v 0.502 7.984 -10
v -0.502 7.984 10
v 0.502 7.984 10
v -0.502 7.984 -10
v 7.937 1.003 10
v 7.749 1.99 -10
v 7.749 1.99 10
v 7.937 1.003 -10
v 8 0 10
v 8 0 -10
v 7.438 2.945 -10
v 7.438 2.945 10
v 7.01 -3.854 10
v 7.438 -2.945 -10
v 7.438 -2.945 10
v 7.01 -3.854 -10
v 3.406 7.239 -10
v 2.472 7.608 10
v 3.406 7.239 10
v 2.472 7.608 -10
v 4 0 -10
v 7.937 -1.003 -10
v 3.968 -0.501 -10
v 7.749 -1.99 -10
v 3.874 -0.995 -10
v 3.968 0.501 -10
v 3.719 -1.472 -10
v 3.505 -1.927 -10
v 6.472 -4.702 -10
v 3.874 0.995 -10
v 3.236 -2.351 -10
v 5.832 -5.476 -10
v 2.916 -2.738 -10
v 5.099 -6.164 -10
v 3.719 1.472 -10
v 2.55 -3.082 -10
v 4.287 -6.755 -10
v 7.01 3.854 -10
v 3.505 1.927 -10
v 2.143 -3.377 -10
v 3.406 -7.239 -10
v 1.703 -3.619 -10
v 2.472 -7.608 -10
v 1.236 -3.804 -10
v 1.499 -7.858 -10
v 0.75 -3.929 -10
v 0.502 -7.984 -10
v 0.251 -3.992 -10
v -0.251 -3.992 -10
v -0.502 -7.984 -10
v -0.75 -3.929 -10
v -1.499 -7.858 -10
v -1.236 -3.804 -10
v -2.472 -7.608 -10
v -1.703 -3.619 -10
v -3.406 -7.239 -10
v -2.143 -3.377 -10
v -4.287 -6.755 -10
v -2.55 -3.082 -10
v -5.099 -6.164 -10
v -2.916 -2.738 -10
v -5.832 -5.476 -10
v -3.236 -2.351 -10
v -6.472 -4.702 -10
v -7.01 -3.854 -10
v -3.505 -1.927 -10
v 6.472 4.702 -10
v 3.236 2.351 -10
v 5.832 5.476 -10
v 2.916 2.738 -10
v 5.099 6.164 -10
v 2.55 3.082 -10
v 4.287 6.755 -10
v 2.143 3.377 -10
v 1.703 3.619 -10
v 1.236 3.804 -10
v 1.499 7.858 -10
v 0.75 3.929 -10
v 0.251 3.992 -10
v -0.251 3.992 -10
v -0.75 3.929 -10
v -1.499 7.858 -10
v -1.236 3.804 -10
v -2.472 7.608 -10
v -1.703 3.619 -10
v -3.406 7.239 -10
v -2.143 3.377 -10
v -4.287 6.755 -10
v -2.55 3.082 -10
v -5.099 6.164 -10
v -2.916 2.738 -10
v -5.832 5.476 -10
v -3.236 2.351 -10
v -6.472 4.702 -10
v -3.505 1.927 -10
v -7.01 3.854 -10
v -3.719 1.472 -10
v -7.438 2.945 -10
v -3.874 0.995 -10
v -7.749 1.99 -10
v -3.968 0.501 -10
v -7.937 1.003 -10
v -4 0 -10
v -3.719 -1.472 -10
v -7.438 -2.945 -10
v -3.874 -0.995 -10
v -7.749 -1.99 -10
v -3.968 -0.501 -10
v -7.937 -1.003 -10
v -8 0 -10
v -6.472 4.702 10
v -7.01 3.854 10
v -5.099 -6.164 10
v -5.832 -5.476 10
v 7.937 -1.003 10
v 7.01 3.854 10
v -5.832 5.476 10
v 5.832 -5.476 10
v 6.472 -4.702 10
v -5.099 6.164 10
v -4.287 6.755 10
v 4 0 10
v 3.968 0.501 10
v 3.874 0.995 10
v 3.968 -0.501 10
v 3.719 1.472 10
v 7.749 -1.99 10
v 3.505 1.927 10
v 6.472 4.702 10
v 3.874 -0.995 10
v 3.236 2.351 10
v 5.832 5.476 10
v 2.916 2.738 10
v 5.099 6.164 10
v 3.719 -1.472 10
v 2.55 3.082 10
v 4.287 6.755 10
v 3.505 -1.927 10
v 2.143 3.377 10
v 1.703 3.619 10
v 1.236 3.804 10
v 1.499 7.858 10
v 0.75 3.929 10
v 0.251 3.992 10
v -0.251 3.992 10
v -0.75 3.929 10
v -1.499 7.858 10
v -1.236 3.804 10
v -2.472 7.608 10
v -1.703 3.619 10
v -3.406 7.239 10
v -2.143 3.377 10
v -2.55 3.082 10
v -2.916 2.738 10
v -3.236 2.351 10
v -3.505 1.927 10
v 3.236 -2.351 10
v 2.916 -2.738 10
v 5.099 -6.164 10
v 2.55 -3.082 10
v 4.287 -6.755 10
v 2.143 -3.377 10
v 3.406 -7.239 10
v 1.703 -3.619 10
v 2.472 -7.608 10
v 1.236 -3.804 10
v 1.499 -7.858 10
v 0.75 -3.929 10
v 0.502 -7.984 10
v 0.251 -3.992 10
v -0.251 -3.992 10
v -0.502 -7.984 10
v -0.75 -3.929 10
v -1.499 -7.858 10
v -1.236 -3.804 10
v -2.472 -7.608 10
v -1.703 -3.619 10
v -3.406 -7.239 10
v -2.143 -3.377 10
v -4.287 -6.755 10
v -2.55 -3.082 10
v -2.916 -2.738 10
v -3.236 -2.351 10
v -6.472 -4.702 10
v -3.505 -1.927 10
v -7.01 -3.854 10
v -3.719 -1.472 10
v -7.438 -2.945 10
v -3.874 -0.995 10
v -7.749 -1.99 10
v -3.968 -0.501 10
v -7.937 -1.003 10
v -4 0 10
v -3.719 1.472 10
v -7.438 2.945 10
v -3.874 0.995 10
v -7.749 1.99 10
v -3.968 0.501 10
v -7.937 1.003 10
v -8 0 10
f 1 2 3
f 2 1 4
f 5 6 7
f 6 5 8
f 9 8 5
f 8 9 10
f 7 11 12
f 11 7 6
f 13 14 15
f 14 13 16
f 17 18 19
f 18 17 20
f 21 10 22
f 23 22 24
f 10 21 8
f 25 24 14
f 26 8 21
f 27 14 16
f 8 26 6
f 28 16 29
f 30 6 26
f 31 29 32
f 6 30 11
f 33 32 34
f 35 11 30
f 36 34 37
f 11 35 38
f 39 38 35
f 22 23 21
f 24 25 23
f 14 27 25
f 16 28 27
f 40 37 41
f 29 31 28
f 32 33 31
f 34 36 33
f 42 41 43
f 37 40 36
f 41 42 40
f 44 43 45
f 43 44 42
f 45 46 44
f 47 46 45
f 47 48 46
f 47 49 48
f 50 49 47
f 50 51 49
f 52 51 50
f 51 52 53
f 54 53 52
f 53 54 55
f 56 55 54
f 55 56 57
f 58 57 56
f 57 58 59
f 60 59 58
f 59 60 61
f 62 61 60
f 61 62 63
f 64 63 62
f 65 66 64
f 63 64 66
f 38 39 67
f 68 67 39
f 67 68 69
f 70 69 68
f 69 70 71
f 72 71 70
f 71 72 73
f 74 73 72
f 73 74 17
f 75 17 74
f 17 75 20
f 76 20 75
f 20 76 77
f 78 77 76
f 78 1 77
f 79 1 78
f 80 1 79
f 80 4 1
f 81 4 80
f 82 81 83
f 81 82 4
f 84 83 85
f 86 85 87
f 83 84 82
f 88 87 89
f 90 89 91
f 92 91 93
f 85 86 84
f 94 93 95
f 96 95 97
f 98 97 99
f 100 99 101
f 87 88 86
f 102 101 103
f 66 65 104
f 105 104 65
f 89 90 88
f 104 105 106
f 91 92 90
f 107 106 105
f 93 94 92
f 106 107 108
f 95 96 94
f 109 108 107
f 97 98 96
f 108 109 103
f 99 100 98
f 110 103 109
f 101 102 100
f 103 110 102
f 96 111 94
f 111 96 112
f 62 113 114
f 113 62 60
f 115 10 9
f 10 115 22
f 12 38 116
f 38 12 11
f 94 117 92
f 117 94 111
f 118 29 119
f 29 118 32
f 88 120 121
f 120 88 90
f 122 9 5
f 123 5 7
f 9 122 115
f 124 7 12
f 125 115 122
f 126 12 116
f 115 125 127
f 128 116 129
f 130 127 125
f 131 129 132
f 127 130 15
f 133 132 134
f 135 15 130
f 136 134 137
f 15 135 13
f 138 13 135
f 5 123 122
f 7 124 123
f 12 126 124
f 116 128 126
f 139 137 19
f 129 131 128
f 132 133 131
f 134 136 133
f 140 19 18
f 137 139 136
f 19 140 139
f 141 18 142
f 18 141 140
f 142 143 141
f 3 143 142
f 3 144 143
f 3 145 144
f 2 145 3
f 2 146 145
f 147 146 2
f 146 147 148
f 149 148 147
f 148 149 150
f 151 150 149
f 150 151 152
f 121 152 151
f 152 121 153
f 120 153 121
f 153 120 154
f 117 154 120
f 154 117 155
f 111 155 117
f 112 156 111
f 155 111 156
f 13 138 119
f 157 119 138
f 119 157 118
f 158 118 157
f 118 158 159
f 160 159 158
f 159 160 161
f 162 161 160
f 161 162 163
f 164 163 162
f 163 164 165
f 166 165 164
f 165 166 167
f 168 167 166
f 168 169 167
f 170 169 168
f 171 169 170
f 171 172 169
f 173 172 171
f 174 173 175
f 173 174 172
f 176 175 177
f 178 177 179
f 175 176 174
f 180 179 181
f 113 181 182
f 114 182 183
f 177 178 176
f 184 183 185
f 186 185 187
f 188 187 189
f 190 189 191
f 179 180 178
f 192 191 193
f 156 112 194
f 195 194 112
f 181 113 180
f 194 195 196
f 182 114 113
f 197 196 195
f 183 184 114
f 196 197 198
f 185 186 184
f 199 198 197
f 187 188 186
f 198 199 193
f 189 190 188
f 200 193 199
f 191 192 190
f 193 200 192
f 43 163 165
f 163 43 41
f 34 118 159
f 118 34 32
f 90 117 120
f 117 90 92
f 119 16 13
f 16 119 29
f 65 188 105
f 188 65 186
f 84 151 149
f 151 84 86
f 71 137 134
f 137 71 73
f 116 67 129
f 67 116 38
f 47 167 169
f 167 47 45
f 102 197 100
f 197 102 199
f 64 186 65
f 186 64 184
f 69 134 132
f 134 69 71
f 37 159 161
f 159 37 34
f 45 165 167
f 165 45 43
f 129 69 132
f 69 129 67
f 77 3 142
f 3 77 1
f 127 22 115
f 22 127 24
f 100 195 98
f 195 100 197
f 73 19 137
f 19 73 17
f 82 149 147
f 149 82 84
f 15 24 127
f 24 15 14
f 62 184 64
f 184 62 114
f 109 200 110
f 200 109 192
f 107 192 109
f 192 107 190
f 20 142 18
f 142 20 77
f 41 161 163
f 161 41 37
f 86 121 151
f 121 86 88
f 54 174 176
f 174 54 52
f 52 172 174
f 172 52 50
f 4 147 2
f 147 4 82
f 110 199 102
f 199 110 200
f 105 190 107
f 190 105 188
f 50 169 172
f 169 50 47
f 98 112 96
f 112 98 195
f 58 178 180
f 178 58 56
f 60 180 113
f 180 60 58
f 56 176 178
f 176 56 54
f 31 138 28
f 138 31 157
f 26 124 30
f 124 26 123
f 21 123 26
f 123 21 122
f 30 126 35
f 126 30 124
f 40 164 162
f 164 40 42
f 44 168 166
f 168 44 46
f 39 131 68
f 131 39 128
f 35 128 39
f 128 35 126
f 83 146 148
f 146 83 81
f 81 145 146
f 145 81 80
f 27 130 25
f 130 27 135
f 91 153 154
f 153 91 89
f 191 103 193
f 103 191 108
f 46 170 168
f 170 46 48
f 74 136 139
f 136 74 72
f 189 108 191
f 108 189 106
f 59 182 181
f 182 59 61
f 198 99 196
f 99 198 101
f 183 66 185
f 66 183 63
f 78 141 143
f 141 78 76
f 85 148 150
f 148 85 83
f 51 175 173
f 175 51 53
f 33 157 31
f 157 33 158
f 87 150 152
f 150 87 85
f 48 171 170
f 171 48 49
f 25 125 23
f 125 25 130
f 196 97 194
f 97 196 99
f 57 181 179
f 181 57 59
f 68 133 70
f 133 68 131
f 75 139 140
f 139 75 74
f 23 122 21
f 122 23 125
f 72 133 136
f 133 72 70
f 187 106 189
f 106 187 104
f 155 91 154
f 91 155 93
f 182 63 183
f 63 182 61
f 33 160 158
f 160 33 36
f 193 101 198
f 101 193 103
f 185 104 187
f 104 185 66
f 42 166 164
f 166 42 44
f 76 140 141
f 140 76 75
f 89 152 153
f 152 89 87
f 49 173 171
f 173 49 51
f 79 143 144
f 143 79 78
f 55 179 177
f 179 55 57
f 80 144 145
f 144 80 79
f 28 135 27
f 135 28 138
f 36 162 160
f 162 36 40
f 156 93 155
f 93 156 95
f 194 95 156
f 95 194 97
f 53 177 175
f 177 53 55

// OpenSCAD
$fn = 50;


difference() {
	union() {
		translate(v = [0, 0, -10.0000000000]) {
			cylinder(h = 20, r = 8.0000000000);
		}
	}
	union() {
		translate(v = [0, 0, -100.0000000000]) {
			cylinder(h = 200, r = 4.0000000000);
		}
	}
}
